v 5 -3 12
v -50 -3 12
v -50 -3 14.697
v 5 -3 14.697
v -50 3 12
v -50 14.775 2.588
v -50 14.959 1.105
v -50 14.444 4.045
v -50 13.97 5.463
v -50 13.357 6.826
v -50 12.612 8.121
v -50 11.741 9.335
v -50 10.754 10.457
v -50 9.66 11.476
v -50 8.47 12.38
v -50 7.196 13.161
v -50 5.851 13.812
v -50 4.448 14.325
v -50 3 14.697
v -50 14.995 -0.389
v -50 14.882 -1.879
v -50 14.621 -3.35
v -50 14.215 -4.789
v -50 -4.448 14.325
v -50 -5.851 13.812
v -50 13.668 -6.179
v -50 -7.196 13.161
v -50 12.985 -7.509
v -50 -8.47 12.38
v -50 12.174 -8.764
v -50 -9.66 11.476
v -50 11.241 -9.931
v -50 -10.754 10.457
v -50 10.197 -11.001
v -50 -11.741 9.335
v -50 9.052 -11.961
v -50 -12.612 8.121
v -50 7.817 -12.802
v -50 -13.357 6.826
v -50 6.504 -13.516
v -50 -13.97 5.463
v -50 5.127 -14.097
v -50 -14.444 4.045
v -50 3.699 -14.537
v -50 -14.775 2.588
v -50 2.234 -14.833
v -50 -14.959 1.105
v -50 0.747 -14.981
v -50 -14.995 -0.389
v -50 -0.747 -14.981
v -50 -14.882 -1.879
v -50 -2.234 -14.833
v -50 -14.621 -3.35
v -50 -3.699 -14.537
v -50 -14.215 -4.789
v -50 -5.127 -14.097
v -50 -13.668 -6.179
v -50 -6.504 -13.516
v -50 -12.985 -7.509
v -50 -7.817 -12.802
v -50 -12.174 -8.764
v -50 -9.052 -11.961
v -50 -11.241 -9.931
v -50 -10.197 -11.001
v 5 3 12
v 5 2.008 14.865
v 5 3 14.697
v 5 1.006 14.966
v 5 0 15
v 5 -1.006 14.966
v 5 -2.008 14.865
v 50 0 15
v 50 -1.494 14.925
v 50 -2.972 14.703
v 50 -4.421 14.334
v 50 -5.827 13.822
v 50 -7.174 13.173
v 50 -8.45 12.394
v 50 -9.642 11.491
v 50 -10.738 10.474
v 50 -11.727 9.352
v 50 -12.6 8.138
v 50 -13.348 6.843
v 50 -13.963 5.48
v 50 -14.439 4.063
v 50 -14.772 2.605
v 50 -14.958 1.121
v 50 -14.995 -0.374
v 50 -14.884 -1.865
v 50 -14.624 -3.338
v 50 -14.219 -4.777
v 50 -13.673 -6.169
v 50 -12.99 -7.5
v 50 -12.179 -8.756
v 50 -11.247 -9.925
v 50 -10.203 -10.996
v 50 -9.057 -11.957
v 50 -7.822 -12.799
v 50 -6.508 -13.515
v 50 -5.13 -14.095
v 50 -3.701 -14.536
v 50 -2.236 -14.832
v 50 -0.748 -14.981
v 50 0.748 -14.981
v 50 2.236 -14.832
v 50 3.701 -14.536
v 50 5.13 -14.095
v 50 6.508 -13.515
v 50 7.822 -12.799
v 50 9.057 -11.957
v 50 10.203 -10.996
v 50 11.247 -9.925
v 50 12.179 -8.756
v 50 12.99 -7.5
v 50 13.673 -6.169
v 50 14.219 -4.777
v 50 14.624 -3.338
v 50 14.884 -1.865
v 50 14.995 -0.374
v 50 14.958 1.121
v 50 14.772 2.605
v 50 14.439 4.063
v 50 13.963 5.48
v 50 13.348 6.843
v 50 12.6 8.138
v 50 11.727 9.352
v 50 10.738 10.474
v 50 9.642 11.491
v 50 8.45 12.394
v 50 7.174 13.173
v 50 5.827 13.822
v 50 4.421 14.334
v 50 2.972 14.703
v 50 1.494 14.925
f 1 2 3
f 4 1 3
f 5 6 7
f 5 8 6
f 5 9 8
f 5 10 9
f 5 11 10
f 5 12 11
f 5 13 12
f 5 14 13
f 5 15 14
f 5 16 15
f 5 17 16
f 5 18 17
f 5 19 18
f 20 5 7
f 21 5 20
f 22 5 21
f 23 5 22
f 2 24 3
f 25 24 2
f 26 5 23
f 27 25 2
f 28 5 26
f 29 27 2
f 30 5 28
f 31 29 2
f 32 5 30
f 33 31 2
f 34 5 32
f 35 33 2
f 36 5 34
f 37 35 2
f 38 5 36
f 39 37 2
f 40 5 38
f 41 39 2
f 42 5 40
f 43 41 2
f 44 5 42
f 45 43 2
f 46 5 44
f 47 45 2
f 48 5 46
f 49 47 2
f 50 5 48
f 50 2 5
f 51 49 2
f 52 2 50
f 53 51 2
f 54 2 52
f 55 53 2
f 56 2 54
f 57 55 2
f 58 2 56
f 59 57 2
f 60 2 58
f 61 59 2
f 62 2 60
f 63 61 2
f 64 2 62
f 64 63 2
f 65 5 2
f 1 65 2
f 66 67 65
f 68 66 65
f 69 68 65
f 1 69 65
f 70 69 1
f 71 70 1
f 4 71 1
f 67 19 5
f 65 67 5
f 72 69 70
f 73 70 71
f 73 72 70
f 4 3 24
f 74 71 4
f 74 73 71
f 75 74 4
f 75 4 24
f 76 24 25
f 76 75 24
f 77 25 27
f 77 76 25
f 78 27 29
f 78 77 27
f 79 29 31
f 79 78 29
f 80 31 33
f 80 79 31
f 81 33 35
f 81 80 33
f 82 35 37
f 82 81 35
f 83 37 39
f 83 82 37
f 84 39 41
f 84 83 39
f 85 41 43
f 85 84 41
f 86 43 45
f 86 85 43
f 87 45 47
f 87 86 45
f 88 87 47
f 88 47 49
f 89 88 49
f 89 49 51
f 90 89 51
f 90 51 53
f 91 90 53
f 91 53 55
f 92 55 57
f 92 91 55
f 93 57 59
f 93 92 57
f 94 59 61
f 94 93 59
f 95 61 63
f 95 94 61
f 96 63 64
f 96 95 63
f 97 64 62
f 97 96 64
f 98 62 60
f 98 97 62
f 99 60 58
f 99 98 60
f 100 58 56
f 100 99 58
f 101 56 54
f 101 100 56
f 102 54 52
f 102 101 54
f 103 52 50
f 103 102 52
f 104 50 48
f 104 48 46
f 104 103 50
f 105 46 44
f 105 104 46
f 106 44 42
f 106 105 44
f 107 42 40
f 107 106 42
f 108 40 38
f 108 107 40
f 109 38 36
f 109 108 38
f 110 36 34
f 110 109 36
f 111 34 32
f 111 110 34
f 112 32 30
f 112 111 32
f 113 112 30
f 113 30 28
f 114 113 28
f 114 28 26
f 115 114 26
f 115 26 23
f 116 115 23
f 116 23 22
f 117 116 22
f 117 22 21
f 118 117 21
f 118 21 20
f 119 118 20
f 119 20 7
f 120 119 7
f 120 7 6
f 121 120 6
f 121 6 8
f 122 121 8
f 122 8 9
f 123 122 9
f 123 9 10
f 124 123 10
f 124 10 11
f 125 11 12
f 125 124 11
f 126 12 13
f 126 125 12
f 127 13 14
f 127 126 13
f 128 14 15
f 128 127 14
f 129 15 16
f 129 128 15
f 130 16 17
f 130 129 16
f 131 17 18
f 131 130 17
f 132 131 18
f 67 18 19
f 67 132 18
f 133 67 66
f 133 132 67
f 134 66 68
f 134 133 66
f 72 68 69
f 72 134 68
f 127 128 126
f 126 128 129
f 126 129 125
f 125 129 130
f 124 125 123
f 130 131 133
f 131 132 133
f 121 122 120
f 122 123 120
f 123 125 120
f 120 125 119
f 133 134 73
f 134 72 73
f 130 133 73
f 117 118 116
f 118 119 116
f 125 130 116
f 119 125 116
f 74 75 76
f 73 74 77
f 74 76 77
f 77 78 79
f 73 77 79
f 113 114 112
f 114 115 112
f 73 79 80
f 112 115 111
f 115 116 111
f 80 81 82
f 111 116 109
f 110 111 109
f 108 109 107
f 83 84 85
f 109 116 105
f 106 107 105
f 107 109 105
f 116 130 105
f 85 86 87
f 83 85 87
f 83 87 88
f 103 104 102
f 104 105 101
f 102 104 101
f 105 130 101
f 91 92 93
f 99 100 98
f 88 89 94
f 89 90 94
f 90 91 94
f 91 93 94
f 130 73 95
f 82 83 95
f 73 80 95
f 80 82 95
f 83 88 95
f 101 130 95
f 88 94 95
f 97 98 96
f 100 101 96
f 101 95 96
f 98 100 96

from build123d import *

# Parameters (mm, degrees)
F0_W     = 100
F0_H     = 15
F3_DEPTH = 55


with BuildPart() as f1:
    # F0 (on Front) → F1 (revolve)
    with BuildSketch(Plane.XZ):
        with Locations((0, 7.5)):
            Rectangle(F0_W, F0_H)
    revolve(axis=Axis((0, 0, 0), (1, 0, 0)))

    # F2 (on face) → F3 (cut)
    with BuildSketch(Plane(origin=(-50, 0, 0), x_dir=(0, -1, 0), z_dir=(-1, 0, 0))):
        with BuildLine():
            Line((3, 12), (3, 14.6969384567))
            ThreePointArc((3, 14.6969384567), (0, 15), (-3, 14.6969384567))
            Line((-3, 14.6969384567), (-3, 12))
            Line((-3, 12), (3, 12))
        make_face()
    extrude(amount=-F3_DEPTH, mode=Mode.SUBTRACT)


solid = f1.part
